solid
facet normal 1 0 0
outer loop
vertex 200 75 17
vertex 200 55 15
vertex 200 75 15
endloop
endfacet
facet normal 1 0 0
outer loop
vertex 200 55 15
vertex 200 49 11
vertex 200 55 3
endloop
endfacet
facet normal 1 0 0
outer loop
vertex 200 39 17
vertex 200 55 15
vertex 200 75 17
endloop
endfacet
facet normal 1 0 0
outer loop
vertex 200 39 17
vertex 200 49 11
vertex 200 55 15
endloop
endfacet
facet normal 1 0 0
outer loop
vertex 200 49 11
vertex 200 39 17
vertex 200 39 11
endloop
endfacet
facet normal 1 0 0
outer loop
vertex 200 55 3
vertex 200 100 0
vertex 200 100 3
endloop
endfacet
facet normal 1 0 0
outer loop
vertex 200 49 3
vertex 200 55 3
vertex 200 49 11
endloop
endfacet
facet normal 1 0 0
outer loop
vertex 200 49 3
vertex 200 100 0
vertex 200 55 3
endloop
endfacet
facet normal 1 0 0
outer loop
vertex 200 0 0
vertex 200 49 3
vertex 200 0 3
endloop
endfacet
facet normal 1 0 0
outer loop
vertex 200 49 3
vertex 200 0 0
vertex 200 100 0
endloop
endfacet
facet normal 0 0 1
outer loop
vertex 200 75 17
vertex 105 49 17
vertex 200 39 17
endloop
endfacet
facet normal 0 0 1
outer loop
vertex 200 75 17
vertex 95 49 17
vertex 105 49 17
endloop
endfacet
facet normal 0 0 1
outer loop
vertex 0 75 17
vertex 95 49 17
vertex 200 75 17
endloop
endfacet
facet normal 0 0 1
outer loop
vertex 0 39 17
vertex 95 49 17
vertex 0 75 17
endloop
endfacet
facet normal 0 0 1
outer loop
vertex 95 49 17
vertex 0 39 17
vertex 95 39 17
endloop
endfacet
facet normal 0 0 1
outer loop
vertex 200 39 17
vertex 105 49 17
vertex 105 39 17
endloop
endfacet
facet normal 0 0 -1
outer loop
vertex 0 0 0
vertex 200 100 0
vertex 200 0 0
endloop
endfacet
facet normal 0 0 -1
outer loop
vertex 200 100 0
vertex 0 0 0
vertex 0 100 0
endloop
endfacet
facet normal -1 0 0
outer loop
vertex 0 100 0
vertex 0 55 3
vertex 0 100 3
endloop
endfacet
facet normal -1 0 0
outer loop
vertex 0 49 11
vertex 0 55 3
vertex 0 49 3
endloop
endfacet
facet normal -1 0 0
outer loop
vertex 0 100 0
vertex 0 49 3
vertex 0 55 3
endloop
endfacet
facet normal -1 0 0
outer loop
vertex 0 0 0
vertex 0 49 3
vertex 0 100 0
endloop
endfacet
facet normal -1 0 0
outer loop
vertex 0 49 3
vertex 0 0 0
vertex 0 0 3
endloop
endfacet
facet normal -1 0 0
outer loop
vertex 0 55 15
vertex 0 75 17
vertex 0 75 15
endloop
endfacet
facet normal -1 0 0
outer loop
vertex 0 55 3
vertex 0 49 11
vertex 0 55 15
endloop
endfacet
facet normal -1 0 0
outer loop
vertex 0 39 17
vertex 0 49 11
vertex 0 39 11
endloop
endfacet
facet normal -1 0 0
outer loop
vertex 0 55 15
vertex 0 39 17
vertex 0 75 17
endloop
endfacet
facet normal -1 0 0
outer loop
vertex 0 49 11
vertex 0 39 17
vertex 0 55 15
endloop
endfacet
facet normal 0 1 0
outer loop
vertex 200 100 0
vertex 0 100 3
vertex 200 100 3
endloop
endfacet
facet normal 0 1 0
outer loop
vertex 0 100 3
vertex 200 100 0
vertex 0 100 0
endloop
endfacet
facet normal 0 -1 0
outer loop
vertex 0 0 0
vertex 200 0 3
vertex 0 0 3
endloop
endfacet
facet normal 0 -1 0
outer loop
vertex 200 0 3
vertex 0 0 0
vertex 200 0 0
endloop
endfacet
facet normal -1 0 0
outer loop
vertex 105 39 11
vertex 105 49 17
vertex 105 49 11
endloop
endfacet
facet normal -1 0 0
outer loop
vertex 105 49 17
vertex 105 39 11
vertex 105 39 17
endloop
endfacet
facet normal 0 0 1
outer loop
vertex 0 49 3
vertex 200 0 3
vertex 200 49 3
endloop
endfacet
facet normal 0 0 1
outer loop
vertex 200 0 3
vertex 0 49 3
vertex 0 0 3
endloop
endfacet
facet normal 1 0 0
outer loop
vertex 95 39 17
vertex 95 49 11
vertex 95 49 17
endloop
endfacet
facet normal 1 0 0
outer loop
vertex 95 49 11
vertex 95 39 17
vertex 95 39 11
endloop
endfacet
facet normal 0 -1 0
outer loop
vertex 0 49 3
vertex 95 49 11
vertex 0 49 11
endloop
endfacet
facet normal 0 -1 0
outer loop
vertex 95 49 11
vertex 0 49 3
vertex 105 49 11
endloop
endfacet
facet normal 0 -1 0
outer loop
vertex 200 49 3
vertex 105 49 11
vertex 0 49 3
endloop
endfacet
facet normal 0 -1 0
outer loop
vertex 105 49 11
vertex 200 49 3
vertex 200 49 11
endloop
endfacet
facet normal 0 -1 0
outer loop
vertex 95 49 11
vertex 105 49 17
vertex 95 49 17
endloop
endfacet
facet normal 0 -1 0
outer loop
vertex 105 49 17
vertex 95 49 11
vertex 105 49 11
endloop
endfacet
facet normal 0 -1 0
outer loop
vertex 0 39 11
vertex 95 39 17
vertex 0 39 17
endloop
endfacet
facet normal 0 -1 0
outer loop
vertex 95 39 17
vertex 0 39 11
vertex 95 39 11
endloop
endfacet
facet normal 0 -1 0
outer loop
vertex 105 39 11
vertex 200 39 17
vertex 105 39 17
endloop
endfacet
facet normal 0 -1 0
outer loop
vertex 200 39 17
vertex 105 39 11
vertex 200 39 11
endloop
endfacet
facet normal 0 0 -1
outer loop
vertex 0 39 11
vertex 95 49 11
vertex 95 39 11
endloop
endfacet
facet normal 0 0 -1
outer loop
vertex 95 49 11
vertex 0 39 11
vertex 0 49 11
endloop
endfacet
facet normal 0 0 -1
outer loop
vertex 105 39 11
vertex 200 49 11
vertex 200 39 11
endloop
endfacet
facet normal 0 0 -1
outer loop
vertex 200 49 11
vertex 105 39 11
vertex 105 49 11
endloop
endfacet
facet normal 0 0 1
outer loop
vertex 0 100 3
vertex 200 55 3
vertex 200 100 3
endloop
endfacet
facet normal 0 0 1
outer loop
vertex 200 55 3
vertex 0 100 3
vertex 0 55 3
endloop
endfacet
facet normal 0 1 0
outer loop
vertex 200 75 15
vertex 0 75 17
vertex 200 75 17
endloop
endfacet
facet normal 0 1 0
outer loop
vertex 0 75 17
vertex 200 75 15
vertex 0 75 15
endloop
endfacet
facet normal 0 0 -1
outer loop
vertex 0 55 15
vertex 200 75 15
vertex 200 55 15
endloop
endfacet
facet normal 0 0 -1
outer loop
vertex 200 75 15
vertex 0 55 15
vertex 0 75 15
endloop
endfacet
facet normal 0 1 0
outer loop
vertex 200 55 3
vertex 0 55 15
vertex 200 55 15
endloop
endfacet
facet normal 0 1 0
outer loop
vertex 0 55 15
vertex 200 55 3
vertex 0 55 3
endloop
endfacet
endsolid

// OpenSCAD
difference()
{
    cube([200,100,17]);
    translate([95,39,3]) cube([10,10,20]);
    translate([-1,-1,3]) cube([210,40,20]);
    translate([-1,-1,3]) cube([210,50,8]);
    translate([-1,75,3]) cube([210,40,20]);
    translate([-1,55,3]) cube([210,50,12]);
}
